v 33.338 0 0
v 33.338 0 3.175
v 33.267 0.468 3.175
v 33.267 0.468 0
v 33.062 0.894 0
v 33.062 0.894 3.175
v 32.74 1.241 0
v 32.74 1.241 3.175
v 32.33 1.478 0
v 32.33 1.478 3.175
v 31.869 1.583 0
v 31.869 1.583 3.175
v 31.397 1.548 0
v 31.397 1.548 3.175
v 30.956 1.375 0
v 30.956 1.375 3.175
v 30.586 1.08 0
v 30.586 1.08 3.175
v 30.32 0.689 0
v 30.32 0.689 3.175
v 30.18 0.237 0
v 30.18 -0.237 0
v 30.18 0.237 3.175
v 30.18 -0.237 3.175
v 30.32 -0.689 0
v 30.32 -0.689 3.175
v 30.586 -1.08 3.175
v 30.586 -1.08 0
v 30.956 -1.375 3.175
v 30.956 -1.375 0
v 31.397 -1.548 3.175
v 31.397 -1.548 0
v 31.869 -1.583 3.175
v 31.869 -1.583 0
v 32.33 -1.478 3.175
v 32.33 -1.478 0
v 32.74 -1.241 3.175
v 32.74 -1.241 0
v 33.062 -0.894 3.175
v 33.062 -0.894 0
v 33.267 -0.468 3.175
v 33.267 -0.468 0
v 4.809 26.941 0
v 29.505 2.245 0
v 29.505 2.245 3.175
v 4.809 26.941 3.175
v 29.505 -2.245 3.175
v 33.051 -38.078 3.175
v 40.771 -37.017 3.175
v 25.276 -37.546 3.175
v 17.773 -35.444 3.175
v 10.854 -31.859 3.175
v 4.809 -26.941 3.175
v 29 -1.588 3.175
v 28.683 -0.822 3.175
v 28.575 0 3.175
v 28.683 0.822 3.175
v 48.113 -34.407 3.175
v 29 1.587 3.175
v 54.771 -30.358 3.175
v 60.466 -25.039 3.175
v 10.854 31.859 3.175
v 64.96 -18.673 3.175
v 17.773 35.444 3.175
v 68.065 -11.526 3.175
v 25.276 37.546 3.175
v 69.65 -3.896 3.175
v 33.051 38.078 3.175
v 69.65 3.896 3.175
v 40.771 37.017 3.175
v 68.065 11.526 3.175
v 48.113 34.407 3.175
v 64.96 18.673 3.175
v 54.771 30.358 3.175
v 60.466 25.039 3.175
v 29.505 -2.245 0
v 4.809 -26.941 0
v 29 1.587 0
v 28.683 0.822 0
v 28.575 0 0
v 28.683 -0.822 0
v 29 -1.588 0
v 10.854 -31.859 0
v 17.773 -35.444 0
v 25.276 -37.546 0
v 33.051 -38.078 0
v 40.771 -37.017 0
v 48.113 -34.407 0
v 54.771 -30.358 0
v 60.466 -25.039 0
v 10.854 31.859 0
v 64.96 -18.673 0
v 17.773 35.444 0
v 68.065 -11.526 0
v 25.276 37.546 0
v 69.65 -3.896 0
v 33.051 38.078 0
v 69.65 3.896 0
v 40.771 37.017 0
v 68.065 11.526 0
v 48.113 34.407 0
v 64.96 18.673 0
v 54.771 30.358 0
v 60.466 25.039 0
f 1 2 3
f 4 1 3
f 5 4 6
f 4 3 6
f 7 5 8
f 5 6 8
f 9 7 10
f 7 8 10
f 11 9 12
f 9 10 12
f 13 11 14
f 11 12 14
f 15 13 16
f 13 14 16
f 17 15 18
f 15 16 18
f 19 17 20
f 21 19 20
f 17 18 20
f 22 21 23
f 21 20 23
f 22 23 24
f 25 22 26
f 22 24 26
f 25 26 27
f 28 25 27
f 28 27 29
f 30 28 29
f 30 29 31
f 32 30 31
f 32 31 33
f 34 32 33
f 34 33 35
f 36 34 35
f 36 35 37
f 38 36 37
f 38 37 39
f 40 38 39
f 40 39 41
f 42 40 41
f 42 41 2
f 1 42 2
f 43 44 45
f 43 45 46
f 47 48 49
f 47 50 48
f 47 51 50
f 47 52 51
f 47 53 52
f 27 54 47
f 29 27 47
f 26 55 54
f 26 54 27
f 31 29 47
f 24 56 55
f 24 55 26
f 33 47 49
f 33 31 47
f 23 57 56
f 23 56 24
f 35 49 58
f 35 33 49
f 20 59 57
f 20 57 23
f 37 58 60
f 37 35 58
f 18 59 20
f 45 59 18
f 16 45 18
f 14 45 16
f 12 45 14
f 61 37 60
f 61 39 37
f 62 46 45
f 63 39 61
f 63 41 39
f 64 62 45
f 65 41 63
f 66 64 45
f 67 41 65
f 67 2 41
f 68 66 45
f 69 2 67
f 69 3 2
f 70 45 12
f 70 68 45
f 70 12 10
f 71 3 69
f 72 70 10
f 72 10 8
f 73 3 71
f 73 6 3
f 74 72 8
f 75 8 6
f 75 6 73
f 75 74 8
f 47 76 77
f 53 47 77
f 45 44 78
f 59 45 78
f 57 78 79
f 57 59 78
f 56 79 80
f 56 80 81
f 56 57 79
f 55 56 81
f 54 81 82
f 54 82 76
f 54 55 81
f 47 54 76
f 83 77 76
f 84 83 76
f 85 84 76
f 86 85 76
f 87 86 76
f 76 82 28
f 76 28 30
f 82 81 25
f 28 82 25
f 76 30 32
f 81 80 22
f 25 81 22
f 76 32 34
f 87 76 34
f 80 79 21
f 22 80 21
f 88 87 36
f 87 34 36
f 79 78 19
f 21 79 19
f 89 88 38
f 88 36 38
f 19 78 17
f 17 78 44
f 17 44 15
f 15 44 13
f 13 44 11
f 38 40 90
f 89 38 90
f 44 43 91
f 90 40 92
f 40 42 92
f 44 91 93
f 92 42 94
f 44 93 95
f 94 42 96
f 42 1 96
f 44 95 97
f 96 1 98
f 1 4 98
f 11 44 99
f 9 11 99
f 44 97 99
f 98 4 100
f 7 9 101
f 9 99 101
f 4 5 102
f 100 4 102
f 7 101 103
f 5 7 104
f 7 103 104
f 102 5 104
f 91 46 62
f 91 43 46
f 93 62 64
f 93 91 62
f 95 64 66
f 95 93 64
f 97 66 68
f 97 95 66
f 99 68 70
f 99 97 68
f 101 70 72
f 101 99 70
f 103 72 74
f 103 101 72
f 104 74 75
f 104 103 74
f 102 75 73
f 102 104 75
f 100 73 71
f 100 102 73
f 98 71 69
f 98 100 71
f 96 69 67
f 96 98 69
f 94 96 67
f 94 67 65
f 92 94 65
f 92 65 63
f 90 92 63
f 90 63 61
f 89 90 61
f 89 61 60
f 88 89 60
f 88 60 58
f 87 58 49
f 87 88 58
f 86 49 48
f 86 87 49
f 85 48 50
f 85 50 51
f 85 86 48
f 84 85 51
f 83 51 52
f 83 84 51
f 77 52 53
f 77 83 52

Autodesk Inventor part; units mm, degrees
ref_plane "YZ Plane" through (0, 0, 0) normal (1, 0, 0) x (0, 1, 0)
ref_plane "XZ Plane" through (0, 0, 0) normal (0, 1, 0) x (-1, 0, 0)
ref_plane "XY Plane" through (0, 0, 0) normal (0, 0, 1) x (1, 0, 0)
sketch "Sketch1" plane through (0, 0, 0) normal (0, 0, 1) x (1, 0, 0)
  circle A0 centre (0, 0) radius 20.32
  circle A1 centre (31.75, 0) radius 38.1
  line L0 (31.75, 0) -> (4.8092, 26.9408)
  line L1 (31.75, 0) -> (4.8092, -26.9408)
  dimension "d0" = 40.64
  dimension "d1" = 90
  dimension "d3" = 0
  dimension "d5" = 31.75
  dimension "d6" = 76.2
extrude "Extrusion1" add sketch "Sketch1" along normal blind 3.175 contours A1 L1 L0
sketch "Sketch2" plane through (0, 0, 3.175) normal (0, 0, 1) x (1, 0, 0)
  line L0 (31.75, 0) -> (4.8092, -26.9408) projected
  circle A0 centre (31.75, 0) radius 1.5875
  circle A1 centre (31.75, 0) radius 3.175
  point P0 (0, 0)
  dimension "d10" = 3.175
  dimension "d11" = 6.35
extrude "Extrusion2" add sketch "Sketch2" against normal blind 3.175
sketch "Sketch3" plane through (0, 0, 3.175) normal (0, 0, 1) x (1, 0, 0)
  line L0 (31.75, 0) -> (30.6275, -1.1225) projected
  circle A0 centre (31.75, 0) radius 1.5875
  point P0 (0, 0)
extrude "Extrusion3" cut sketch "Sketch3" against normal blind 3.175
properties part number "Release1"
